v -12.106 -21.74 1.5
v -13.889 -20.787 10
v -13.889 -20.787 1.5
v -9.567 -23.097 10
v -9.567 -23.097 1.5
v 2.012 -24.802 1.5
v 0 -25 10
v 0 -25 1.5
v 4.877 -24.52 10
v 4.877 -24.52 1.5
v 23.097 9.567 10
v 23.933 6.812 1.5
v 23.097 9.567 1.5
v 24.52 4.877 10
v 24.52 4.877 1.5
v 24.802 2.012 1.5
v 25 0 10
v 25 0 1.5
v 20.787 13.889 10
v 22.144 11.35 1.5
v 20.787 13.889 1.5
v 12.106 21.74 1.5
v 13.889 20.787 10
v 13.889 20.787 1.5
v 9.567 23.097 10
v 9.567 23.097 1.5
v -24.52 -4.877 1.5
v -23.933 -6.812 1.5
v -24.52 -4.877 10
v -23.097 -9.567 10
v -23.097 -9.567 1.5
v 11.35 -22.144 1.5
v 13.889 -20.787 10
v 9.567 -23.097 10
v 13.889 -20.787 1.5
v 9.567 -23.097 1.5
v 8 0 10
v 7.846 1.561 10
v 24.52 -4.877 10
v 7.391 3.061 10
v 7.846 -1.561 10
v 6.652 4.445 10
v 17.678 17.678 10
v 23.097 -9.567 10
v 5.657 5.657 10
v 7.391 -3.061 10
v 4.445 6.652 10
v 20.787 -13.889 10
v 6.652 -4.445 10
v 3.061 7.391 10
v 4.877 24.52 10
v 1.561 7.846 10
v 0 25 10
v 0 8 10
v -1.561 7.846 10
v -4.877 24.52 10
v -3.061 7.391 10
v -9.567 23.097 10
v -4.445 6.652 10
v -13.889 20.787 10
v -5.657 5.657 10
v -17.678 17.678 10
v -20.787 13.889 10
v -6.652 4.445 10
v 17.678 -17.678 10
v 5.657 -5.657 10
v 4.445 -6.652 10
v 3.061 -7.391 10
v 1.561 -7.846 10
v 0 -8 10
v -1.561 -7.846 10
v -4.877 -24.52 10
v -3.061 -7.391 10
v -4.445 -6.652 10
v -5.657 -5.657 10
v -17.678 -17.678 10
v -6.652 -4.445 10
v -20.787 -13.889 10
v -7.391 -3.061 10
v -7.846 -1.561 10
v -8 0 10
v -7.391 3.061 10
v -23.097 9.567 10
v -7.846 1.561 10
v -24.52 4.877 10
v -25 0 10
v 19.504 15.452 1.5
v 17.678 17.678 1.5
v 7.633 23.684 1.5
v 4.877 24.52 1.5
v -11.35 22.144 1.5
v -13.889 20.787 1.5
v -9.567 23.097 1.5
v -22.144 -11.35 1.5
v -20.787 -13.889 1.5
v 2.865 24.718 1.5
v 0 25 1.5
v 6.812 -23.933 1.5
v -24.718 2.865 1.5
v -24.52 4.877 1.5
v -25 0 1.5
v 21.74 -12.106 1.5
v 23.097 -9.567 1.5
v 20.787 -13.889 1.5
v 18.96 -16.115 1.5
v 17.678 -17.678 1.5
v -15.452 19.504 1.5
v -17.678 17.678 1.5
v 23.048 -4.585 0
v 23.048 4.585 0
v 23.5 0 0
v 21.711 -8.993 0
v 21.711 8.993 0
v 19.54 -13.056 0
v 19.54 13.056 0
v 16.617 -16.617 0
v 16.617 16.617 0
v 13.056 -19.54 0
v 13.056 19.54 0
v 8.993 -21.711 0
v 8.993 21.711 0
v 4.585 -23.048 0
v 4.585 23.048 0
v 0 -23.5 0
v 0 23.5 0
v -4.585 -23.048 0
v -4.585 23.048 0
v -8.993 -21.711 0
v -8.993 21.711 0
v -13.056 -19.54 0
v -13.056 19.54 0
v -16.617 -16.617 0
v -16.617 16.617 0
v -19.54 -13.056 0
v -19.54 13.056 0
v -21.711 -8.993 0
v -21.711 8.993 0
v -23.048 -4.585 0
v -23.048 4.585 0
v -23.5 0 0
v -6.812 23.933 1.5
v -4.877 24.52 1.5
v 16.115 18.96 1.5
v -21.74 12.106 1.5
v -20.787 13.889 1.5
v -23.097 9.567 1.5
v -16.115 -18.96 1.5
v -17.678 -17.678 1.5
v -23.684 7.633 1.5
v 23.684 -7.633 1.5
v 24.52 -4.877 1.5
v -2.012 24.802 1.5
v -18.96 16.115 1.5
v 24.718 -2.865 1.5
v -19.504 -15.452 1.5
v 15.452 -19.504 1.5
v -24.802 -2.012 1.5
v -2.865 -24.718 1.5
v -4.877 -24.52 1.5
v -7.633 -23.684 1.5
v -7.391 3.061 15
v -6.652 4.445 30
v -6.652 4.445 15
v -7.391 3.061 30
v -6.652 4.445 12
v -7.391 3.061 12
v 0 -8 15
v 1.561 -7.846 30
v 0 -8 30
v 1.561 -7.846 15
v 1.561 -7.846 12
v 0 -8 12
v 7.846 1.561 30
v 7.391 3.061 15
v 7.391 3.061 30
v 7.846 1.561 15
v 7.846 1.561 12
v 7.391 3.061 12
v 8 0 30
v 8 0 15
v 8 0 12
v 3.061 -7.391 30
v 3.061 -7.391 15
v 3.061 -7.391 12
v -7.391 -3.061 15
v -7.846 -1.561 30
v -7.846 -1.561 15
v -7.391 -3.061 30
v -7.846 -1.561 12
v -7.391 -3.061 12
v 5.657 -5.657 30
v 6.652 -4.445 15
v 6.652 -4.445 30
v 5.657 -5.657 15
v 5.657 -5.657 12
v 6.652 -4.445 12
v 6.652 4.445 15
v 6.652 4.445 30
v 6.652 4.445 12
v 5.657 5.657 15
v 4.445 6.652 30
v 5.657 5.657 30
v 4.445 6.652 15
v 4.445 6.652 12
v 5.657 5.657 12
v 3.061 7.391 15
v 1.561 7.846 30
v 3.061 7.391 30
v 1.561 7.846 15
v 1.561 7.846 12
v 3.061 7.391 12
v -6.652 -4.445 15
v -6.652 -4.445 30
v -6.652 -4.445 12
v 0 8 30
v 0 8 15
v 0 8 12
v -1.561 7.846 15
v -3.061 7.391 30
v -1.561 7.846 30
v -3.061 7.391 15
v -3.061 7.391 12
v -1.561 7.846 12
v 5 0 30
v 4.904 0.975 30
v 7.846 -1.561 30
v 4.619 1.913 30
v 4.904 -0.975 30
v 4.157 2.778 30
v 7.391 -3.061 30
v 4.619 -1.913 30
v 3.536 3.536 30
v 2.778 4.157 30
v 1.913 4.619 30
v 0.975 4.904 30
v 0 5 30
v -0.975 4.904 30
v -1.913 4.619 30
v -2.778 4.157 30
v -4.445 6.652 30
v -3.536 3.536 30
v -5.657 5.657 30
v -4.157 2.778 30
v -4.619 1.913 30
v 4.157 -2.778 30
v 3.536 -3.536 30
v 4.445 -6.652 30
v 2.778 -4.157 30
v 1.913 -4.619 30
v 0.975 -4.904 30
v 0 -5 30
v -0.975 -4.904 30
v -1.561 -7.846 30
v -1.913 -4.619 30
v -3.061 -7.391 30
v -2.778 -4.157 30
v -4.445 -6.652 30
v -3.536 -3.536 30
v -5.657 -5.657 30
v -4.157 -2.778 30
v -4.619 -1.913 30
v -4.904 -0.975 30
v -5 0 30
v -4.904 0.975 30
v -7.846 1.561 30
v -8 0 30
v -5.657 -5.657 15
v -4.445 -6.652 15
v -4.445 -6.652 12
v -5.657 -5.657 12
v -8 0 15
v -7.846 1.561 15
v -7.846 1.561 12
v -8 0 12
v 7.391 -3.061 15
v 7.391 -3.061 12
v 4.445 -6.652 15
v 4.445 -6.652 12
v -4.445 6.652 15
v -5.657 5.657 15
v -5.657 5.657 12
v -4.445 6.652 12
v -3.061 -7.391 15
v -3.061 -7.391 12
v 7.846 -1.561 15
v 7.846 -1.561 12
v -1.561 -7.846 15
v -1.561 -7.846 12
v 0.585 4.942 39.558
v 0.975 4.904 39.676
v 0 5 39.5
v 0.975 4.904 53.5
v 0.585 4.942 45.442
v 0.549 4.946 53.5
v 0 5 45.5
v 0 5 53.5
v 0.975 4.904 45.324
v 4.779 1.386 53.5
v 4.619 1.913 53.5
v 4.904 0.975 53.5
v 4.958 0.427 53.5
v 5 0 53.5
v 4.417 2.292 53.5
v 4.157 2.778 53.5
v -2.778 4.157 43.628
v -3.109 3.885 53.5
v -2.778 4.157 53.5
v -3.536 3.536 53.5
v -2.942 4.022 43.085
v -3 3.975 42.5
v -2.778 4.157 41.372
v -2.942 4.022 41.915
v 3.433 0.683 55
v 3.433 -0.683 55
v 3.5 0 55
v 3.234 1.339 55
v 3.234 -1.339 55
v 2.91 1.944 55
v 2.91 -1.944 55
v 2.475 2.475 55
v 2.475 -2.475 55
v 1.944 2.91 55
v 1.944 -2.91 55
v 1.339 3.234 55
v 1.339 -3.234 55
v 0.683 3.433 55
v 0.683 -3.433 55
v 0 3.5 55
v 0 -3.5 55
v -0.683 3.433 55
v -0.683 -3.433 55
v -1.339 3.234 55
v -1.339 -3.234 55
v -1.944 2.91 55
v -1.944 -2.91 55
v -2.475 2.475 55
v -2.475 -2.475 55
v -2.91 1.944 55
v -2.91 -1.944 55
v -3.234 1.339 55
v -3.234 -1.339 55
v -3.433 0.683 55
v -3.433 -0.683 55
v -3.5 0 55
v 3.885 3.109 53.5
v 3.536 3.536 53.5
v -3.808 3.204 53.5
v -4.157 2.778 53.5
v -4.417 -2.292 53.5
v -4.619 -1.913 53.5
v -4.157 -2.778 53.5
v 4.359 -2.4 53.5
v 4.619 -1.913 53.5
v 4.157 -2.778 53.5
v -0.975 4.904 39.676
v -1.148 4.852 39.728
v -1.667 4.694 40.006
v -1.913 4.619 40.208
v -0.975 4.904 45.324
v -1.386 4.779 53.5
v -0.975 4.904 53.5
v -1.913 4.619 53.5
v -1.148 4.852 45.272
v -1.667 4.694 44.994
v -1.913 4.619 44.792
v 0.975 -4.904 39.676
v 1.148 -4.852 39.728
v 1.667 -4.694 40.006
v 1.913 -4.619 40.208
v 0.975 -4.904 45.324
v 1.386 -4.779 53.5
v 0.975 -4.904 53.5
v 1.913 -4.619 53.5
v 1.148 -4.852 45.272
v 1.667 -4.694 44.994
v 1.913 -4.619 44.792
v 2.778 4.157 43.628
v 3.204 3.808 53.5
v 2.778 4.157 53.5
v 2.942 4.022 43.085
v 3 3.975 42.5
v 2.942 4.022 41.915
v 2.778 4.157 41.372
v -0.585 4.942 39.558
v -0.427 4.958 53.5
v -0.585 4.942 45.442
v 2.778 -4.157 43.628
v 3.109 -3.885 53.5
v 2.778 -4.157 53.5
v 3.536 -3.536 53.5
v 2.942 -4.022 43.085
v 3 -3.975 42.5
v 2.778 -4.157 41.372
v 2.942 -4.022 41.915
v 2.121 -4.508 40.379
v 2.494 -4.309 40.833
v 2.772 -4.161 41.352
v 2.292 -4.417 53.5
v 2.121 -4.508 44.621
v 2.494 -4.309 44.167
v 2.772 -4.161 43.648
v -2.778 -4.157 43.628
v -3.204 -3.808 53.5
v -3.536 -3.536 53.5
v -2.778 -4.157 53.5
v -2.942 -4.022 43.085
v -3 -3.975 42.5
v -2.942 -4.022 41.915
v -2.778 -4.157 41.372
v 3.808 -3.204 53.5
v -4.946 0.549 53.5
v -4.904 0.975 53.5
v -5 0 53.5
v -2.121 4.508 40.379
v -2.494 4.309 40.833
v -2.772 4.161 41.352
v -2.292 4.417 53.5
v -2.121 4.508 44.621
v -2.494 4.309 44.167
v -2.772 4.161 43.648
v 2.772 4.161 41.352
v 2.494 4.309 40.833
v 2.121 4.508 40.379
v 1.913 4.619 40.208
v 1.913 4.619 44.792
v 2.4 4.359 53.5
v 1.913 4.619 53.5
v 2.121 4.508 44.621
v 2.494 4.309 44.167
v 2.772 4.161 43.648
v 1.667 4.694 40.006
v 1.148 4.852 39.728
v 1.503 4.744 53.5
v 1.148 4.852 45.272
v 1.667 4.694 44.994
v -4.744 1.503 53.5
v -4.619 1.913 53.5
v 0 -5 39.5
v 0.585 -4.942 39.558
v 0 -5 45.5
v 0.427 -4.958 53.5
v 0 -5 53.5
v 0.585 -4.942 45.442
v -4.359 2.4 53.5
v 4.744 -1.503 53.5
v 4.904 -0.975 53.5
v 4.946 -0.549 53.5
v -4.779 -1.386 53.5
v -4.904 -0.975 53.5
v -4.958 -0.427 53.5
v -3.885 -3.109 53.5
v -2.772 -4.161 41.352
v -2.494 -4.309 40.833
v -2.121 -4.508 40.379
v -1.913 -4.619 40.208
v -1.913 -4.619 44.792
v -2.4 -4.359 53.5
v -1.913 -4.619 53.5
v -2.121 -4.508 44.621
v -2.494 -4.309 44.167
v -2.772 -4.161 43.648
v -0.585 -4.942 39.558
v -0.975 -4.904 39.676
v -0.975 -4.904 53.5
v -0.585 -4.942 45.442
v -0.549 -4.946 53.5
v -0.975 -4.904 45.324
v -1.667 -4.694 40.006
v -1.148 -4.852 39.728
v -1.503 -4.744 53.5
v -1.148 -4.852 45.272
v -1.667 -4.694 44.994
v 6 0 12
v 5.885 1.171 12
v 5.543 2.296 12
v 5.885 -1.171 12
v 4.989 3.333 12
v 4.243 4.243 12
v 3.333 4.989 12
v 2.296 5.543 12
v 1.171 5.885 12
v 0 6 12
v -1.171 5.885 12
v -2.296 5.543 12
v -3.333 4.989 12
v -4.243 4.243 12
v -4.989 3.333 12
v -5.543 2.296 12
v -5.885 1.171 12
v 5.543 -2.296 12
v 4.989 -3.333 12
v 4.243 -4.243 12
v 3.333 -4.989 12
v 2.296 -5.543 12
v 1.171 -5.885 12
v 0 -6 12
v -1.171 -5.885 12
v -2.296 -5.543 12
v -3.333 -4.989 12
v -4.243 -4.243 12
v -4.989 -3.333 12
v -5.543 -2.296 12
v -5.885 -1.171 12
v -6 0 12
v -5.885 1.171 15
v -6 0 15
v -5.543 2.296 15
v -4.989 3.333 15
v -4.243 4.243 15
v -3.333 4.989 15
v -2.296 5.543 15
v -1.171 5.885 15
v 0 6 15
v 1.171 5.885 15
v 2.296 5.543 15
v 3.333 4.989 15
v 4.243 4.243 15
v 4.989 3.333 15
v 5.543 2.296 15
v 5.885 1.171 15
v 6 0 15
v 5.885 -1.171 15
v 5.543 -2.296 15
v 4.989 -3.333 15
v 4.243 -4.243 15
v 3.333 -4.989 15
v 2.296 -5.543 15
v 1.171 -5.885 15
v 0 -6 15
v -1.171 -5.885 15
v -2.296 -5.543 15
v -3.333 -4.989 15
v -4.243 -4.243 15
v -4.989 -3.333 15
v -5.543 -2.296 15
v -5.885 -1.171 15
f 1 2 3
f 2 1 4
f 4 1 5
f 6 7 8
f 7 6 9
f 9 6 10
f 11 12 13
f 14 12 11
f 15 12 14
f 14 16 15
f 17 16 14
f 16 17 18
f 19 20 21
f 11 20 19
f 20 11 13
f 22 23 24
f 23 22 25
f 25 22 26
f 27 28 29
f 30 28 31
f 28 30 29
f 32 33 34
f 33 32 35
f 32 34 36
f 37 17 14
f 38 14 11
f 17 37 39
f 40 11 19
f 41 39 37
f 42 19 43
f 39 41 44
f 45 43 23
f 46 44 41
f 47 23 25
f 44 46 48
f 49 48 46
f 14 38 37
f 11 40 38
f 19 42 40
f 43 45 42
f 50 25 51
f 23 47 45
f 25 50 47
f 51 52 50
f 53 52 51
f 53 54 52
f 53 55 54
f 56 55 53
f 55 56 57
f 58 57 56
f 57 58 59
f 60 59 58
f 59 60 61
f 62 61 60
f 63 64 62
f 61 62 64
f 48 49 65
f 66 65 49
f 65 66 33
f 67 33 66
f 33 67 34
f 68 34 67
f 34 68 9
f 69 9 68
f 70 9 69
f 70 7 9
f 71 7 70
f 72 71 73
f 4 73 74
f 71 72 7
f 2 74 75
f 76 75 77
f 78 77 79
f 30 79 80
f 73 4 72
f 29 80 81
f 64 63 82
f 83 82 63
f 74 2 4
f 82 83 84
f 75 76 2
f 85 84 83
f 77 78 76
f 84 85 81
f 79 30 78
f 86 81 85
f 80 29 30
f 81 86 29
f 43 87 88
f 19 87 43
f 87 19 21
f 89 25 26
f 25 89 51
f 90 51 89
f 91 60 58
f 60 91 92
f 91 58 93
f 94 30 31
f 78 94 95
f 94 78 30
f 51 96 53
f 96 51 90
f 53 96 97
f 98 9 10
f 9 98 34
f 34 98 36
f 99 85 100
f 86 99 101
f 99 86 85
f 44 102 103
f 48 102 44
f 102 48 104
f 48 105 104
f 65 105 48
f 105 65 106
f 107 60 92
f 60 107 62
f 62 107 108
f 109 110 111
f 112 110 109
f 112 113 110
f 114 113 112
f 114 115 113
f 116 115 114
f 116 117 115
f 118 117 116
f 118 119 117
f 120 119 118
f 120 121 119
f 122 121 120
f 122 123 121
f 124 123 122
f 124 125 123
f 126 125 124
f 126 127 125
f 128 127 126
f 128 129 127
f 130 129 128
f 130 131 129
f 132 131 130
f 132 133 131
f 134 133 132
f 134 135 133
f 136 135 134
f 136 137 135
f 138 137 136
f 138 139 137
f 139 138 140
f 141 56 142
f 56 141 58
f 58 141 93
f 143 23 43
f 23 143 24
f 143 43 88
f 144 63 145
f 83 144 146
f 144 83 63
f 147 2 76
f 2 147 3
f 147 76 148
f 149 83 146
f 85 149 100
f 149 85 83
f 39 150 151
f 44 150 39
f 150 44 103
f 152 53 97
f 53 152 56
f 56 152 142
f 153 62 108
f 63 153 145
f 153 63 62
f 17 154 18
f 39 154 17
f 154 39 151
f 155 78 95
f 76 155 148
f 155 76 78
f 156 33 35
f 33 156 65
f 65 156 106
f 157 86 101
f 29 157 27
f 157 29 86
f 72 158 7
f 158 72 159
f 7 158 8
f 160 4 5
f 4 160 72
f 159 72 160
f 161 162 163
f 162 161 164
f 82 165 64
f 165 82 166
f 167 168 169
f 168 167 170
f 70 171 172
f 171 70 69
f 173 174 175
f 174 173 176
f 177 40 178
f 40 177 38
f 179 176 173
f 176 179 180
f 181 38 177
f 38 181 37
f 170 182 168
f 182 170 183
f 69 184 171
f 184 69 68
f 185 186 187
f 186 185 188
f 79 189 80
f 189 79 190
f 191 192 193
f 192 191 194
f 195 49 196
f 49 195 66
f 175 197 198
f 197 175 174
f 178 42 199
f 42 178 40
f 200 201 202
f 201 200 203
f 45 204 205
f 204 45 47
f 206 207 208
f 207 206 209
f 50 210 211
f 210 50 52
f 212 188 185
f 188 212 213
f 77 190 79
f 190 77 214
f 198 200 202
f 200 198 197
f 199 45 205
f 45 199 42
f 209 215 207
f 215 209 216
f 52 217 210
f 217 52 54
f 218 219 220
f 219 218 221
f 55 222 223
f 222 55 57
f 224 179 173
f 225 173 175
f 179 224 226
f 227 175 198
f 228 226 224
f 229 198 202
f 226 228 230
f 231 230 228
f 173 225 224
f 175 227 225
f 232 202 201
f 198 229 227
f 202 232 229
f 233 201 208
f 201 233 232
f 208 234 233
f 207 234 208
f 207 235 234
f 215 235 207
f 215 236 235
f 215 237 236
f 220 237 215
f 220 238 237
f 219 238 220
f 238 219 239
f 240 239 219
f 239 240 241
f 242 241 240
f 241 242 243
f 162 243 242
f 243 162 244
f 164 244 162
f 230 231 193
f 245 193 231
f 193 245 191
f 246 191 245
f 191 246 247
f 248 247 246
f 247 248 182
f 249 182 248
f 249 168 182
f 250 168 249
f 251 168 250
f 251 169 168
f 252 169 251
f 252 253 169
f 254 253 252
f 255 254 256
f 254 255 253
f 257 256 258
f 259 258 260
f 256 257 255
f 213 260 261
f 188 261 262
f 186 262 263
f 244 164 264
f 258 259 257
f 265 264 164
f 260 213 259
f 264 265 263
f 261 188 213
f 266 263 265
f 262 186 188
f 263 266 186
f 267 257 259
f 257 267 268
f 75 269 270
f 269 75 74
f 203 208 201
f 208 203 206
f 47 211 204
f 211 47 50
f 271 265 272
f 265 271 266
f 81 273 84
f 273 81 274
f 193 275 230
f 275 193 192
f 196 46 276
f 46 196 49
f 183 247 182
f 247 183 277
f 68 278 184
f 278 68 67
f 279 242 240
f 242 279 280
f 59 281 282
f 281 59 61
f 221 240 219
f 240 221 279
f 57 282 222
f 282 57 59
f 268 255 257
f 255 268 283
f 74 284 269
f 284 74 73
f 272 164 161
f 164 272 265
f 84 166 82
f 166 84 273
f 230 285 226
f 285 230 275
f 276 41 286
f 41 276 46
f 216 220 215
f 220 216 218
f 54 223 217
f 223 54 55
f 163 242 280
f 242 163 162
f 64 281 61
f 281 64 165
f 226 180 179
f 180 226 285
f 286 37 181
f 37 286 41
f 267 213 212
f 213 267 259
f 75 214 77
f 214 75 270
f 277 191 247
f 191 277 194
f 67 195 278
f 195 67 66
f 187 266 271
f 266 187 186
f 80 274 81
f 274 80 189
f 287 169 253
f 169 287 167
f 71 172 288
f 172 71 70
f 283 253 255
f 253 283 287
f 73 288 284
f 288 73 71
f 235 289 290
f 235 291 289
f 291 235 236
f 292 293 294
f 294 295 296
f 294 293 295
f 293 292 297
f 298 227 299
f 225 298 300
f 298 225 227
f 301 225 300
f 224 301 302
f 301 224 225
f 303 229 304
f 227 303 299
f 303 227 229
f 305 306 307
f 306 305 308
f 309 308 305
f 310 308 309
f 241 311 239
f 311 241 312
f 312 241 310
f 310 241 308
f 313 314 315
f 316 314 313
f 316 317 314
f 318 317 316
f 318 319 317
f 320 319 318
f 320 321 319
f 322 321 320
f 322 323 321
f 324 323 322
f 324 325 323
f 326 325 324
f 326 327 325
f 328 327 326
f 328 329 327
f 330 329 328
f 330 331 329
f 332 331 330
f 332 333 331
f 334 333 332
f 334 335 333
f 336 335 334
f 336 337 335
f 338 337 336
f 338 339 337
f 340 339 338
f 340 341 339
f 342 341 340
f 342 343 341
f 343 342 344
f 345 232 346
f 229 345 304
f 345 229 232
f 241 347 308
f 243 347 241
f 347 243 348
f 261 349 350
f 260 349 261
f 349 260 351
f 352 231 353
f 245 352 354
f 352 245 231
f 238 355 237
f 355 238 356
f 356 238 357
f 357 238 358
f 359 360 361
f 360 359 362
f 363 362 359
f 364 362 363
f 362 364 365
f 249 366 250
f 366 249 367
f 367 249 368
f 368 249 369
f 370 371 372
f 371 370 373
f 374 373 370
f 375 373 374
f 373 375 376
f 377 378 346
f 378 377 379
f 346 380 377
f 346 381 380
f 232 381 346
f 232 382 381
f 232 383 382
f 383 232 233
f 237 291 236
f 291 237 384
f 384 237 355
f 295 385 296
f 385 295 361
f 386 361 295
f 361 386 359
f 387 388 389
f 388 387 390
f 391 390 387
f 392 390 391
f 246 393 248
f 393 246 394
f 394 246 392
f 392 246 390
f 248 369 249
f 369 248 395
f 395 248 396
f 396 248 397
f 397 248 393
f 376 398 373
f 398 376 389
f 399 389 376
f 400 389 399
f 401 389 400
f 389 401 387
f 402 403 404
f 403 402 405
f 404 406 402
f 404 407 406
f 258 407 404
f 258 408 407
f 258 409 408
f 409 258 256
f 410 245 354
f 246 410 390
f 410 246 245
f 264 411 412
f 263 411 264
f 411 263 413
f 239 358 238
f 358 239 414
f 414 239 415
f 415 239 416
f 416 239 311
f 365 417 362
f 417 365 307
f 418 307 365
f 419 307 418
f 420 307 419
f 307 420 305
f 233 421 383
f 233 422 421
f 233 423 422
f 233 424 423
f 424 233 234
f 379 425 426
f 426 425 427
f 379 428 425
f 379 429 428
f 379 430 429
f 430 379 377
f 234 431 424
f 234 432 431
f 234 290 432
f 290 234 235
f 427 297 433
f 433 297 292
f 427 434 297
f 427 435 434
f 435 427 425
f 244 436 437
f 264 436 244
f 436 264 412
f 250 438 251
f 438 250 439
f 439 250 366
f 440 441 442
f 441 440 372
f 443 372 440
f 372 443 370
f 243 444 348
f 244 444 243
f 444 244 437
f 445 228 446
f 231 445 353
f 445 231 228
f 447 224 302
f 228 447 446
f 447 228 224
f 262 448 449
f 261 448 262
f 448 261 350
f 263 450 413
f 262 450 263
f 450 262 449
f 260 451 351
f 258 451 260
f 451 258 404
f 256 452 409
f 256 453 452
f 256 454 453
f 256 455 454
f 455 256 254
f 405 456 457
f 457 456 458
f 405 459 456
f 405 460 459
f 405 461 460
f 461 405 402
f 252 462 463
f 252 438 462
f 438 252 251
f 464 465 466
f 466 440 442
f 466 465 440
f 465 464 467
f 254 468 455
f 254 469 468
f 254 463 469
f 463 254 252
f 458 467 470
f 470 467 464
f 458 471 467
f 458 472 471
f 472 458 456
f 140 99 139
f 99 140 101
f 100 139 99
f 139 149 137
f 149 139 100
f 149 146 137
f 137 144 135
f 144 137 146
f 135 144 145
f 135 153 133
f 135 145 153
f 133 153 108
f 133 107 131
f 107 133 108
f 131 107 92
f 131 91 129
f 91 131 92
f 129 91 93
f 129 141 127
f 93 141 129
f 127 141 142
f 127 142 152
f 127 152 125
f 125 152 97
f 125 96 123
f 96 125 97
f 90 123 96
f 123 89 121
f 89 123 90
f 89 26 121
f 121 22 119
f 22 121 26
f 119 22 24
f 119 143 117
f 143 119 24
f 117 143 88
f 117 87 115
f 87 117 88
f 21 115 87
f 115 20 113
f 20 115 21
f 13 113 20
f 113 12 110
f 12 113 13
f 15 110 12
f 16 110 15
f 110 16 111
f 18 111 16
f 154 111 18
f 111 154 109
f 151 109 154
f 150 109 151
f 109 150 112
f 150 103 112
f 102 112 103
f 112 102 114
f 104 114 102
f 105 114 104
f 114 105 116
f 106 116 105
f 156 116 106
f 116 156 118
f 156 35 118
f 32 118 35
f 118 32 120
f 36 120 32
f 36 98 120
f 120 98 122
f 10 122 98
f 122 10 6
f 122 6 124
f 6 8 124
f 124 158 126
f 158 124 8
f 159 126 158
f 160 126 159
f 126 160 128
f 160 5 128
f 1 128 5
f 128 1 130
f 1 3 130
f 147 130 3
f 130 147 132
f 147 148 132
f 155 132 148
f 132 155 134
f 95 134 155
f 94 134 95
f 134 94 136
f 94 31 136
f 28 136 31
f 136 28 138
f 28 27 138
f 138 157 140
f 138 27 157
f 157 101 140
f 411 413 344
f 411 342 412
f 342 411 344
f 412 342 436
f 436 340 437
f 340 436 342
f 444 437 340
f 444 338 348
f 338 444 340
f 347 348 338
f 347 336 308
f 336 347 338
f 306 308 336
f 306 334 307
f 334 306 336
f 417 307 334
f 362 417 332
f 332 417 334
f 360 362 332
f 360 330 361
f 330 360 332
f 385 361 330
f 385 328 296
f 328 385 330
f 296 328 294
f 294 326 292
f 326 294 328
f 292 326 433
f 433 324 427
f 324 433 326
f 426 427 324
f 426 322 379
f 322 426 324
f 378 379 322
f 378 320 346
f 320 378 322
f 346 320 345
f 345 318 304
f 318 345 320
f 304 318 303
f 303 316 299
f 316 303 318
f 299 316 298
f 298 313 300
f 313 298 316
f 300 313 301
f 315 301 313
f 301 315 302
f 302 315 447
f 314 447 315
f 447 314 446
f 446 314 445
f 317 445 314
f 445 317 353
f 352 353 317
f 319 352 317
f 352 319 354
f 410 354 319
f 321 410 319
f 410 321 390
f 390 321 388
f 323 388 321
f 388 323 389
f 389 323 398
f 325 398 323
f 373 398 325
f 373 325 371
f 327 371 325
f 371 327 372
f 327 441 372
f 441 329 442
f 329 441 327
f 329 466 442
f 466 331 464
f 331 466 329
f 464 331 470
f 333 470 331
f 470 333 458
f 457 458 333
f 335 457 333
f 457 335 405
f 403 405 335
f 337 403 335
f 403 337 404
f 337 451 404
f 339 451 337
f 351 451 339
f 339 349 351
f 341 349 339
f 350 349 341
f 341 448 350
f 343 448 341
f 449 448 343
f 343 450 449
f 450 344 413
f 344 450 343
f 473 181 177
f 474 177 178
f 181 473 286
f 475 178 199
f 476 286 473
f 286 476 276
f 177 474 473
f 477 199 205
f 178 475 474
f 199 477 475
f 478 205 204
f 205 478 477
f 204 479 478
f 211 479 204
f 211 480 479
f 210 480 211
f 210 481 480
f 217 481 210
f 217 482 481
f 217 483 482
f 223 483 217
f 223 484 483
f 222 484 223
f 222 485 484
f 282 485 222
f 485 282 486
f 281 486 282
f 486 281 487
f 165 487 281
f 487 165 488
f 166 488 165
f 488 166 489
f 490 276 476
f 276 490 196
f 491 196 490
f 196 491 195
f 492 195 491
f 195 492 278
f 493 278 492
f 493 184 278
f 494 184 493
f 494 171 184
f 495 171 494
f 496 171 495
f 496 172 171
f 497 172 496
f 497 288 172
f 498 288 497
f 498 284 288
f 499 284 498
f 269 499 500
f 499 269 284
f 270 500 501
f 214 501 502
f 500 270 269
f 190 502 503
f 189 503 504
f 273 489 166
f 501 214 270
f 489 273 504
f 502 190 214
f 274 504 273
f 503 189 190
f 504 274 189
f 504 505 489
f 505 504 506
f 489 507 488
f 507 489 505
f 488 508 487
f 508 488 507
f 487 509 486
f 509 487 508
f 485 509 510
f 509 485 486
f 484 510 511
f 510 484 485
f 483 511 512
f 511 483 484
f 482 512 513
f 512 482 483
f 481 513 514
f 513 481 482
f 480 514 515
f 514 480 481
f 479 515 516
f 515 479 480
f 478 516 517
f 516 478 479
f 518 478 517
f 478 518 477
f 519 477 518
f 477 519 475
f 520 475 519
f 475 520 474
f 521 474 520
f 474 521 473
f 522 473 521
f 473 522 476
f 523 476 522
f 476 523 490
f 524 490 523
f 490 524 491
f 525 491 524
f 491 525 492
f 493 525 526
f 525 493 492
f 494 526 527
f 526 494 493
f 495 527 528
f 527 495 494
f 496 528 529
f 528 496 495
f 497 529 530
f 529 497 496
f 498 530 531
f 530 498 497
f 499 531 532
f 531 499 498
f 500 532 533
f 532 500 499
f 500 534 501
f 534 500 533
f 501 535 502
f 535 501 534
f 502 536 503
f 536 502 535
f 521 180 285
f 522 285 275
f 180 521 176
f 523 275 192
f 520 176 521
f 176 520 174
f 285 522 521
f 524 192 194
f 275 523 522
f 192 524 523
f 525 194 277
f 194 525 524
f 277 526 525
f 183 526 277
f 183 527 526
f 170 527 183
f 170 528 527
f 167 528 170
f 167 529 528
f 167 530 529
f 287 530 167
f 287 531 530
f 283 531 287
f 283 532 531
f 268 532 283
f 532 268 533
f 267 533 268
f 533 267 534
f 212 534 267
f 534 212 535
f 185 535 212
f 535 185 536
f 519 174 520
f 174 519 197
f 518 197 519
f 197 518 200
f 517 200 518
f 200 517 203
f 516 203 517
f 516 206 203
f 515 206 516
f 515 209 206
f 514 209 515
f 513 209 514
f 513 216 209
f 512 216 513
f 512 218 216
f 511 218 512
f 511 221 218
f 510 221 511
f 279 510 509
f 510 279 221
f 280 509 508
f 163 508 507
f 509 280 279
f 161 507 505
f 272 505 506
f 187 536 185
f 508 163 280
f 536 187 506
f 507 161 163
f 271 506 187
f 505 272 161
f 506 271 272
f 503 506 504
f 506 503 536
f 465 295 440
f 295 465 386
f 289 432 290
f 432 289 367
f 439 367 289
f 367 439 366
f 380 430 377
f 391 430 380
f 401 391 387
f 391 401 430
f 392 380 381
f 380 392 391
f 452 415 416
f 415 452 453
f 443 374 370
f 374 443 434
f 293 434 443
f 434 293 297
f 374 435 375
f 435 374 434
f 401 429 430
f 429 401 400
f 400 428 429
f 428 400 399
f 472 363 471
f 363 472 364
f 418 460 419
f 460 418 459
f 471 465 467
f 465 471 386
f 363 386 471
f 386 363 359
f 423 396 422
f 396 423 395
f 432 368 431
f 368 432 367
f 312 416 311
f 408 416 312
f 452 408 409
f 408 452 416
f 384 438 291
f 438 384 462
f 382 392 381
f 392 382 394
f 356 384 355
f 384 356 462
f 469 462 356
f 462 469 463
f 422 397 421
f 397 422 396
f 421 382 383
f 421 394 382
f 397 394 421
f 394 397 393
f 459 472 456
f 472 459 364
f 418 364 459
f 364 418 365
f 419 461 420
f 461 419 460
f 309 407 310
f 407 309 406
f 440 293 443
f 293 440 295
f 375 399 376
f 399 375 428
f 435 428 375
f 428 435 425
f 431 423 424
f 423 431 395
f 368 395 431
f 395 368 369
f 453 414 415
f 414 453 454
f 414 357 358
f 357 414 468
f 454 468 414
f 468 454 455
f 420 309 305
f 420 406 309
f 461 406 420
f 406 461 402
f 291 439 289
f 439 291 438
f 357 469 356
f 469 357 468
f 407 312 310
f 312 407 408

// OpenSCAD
$fn = 32;

// ----------------------------------------------------------------------
// Stepped shaft: diameters 50, 16, 10 mm, 55 mm long
// ----------------------------------------------------------------------

// --- parameters (mm) ---
d1 = 50;                  // step 1 diameter
len1 = 10;                // step 1 length
d2 = 16;                  // step 2 diameter
len2 = 20;                // step 2 length
d3 = 10;                  // step 3 diameter
len3 = 25;                // step 3 length
total = 55;               // overall length
chamfer = 1.5;            // end chamfer
groove_r = 8;             // groove radius
groove_z = 12;            // groove position from the end
groove_w = 3;             // groove width
groove_d = 2;             // groove depth
cross_d = 6;              // cross pin hole
cross_z = 42.5;           // cross hole position

difference() {
  /* turned body: stacked cylinders, every step sunk into the bigger one */
  union() {
    cylinder(h = len1, d = d1);
    translate([0, 0, 9.6]) cylinder(h = 20.4, d = d2);
    translate([0, 0, 29.6]) cylinder(h = 25.4, d = d3);
  }
  /* bottom chamfer ring cut */
  rotate_extrude() translate([23.5, -2.5]) polygon([[0, 0], [4, 0], [4, 6.5], [0, 2.5]]);
  /* top chamfer ring cut */
  rotate_extrude() translate([3.5, 55]) polygon([[0, 0], [4, -4], [4, 2.5], [0, 2.5]]);
  /* circlip groove just behind the shoulder */
  rotate_extrude() translate([groove_r - groove_d, groove_z]) square([groove_d + 2.5, groove_w]);
  /* cross pin hole through the small step */
  translate([0, 0, cross_z]) rotate([90, 0, 0]) cylinder(h = d3 + 5, d = cross_d, center = true);
}
